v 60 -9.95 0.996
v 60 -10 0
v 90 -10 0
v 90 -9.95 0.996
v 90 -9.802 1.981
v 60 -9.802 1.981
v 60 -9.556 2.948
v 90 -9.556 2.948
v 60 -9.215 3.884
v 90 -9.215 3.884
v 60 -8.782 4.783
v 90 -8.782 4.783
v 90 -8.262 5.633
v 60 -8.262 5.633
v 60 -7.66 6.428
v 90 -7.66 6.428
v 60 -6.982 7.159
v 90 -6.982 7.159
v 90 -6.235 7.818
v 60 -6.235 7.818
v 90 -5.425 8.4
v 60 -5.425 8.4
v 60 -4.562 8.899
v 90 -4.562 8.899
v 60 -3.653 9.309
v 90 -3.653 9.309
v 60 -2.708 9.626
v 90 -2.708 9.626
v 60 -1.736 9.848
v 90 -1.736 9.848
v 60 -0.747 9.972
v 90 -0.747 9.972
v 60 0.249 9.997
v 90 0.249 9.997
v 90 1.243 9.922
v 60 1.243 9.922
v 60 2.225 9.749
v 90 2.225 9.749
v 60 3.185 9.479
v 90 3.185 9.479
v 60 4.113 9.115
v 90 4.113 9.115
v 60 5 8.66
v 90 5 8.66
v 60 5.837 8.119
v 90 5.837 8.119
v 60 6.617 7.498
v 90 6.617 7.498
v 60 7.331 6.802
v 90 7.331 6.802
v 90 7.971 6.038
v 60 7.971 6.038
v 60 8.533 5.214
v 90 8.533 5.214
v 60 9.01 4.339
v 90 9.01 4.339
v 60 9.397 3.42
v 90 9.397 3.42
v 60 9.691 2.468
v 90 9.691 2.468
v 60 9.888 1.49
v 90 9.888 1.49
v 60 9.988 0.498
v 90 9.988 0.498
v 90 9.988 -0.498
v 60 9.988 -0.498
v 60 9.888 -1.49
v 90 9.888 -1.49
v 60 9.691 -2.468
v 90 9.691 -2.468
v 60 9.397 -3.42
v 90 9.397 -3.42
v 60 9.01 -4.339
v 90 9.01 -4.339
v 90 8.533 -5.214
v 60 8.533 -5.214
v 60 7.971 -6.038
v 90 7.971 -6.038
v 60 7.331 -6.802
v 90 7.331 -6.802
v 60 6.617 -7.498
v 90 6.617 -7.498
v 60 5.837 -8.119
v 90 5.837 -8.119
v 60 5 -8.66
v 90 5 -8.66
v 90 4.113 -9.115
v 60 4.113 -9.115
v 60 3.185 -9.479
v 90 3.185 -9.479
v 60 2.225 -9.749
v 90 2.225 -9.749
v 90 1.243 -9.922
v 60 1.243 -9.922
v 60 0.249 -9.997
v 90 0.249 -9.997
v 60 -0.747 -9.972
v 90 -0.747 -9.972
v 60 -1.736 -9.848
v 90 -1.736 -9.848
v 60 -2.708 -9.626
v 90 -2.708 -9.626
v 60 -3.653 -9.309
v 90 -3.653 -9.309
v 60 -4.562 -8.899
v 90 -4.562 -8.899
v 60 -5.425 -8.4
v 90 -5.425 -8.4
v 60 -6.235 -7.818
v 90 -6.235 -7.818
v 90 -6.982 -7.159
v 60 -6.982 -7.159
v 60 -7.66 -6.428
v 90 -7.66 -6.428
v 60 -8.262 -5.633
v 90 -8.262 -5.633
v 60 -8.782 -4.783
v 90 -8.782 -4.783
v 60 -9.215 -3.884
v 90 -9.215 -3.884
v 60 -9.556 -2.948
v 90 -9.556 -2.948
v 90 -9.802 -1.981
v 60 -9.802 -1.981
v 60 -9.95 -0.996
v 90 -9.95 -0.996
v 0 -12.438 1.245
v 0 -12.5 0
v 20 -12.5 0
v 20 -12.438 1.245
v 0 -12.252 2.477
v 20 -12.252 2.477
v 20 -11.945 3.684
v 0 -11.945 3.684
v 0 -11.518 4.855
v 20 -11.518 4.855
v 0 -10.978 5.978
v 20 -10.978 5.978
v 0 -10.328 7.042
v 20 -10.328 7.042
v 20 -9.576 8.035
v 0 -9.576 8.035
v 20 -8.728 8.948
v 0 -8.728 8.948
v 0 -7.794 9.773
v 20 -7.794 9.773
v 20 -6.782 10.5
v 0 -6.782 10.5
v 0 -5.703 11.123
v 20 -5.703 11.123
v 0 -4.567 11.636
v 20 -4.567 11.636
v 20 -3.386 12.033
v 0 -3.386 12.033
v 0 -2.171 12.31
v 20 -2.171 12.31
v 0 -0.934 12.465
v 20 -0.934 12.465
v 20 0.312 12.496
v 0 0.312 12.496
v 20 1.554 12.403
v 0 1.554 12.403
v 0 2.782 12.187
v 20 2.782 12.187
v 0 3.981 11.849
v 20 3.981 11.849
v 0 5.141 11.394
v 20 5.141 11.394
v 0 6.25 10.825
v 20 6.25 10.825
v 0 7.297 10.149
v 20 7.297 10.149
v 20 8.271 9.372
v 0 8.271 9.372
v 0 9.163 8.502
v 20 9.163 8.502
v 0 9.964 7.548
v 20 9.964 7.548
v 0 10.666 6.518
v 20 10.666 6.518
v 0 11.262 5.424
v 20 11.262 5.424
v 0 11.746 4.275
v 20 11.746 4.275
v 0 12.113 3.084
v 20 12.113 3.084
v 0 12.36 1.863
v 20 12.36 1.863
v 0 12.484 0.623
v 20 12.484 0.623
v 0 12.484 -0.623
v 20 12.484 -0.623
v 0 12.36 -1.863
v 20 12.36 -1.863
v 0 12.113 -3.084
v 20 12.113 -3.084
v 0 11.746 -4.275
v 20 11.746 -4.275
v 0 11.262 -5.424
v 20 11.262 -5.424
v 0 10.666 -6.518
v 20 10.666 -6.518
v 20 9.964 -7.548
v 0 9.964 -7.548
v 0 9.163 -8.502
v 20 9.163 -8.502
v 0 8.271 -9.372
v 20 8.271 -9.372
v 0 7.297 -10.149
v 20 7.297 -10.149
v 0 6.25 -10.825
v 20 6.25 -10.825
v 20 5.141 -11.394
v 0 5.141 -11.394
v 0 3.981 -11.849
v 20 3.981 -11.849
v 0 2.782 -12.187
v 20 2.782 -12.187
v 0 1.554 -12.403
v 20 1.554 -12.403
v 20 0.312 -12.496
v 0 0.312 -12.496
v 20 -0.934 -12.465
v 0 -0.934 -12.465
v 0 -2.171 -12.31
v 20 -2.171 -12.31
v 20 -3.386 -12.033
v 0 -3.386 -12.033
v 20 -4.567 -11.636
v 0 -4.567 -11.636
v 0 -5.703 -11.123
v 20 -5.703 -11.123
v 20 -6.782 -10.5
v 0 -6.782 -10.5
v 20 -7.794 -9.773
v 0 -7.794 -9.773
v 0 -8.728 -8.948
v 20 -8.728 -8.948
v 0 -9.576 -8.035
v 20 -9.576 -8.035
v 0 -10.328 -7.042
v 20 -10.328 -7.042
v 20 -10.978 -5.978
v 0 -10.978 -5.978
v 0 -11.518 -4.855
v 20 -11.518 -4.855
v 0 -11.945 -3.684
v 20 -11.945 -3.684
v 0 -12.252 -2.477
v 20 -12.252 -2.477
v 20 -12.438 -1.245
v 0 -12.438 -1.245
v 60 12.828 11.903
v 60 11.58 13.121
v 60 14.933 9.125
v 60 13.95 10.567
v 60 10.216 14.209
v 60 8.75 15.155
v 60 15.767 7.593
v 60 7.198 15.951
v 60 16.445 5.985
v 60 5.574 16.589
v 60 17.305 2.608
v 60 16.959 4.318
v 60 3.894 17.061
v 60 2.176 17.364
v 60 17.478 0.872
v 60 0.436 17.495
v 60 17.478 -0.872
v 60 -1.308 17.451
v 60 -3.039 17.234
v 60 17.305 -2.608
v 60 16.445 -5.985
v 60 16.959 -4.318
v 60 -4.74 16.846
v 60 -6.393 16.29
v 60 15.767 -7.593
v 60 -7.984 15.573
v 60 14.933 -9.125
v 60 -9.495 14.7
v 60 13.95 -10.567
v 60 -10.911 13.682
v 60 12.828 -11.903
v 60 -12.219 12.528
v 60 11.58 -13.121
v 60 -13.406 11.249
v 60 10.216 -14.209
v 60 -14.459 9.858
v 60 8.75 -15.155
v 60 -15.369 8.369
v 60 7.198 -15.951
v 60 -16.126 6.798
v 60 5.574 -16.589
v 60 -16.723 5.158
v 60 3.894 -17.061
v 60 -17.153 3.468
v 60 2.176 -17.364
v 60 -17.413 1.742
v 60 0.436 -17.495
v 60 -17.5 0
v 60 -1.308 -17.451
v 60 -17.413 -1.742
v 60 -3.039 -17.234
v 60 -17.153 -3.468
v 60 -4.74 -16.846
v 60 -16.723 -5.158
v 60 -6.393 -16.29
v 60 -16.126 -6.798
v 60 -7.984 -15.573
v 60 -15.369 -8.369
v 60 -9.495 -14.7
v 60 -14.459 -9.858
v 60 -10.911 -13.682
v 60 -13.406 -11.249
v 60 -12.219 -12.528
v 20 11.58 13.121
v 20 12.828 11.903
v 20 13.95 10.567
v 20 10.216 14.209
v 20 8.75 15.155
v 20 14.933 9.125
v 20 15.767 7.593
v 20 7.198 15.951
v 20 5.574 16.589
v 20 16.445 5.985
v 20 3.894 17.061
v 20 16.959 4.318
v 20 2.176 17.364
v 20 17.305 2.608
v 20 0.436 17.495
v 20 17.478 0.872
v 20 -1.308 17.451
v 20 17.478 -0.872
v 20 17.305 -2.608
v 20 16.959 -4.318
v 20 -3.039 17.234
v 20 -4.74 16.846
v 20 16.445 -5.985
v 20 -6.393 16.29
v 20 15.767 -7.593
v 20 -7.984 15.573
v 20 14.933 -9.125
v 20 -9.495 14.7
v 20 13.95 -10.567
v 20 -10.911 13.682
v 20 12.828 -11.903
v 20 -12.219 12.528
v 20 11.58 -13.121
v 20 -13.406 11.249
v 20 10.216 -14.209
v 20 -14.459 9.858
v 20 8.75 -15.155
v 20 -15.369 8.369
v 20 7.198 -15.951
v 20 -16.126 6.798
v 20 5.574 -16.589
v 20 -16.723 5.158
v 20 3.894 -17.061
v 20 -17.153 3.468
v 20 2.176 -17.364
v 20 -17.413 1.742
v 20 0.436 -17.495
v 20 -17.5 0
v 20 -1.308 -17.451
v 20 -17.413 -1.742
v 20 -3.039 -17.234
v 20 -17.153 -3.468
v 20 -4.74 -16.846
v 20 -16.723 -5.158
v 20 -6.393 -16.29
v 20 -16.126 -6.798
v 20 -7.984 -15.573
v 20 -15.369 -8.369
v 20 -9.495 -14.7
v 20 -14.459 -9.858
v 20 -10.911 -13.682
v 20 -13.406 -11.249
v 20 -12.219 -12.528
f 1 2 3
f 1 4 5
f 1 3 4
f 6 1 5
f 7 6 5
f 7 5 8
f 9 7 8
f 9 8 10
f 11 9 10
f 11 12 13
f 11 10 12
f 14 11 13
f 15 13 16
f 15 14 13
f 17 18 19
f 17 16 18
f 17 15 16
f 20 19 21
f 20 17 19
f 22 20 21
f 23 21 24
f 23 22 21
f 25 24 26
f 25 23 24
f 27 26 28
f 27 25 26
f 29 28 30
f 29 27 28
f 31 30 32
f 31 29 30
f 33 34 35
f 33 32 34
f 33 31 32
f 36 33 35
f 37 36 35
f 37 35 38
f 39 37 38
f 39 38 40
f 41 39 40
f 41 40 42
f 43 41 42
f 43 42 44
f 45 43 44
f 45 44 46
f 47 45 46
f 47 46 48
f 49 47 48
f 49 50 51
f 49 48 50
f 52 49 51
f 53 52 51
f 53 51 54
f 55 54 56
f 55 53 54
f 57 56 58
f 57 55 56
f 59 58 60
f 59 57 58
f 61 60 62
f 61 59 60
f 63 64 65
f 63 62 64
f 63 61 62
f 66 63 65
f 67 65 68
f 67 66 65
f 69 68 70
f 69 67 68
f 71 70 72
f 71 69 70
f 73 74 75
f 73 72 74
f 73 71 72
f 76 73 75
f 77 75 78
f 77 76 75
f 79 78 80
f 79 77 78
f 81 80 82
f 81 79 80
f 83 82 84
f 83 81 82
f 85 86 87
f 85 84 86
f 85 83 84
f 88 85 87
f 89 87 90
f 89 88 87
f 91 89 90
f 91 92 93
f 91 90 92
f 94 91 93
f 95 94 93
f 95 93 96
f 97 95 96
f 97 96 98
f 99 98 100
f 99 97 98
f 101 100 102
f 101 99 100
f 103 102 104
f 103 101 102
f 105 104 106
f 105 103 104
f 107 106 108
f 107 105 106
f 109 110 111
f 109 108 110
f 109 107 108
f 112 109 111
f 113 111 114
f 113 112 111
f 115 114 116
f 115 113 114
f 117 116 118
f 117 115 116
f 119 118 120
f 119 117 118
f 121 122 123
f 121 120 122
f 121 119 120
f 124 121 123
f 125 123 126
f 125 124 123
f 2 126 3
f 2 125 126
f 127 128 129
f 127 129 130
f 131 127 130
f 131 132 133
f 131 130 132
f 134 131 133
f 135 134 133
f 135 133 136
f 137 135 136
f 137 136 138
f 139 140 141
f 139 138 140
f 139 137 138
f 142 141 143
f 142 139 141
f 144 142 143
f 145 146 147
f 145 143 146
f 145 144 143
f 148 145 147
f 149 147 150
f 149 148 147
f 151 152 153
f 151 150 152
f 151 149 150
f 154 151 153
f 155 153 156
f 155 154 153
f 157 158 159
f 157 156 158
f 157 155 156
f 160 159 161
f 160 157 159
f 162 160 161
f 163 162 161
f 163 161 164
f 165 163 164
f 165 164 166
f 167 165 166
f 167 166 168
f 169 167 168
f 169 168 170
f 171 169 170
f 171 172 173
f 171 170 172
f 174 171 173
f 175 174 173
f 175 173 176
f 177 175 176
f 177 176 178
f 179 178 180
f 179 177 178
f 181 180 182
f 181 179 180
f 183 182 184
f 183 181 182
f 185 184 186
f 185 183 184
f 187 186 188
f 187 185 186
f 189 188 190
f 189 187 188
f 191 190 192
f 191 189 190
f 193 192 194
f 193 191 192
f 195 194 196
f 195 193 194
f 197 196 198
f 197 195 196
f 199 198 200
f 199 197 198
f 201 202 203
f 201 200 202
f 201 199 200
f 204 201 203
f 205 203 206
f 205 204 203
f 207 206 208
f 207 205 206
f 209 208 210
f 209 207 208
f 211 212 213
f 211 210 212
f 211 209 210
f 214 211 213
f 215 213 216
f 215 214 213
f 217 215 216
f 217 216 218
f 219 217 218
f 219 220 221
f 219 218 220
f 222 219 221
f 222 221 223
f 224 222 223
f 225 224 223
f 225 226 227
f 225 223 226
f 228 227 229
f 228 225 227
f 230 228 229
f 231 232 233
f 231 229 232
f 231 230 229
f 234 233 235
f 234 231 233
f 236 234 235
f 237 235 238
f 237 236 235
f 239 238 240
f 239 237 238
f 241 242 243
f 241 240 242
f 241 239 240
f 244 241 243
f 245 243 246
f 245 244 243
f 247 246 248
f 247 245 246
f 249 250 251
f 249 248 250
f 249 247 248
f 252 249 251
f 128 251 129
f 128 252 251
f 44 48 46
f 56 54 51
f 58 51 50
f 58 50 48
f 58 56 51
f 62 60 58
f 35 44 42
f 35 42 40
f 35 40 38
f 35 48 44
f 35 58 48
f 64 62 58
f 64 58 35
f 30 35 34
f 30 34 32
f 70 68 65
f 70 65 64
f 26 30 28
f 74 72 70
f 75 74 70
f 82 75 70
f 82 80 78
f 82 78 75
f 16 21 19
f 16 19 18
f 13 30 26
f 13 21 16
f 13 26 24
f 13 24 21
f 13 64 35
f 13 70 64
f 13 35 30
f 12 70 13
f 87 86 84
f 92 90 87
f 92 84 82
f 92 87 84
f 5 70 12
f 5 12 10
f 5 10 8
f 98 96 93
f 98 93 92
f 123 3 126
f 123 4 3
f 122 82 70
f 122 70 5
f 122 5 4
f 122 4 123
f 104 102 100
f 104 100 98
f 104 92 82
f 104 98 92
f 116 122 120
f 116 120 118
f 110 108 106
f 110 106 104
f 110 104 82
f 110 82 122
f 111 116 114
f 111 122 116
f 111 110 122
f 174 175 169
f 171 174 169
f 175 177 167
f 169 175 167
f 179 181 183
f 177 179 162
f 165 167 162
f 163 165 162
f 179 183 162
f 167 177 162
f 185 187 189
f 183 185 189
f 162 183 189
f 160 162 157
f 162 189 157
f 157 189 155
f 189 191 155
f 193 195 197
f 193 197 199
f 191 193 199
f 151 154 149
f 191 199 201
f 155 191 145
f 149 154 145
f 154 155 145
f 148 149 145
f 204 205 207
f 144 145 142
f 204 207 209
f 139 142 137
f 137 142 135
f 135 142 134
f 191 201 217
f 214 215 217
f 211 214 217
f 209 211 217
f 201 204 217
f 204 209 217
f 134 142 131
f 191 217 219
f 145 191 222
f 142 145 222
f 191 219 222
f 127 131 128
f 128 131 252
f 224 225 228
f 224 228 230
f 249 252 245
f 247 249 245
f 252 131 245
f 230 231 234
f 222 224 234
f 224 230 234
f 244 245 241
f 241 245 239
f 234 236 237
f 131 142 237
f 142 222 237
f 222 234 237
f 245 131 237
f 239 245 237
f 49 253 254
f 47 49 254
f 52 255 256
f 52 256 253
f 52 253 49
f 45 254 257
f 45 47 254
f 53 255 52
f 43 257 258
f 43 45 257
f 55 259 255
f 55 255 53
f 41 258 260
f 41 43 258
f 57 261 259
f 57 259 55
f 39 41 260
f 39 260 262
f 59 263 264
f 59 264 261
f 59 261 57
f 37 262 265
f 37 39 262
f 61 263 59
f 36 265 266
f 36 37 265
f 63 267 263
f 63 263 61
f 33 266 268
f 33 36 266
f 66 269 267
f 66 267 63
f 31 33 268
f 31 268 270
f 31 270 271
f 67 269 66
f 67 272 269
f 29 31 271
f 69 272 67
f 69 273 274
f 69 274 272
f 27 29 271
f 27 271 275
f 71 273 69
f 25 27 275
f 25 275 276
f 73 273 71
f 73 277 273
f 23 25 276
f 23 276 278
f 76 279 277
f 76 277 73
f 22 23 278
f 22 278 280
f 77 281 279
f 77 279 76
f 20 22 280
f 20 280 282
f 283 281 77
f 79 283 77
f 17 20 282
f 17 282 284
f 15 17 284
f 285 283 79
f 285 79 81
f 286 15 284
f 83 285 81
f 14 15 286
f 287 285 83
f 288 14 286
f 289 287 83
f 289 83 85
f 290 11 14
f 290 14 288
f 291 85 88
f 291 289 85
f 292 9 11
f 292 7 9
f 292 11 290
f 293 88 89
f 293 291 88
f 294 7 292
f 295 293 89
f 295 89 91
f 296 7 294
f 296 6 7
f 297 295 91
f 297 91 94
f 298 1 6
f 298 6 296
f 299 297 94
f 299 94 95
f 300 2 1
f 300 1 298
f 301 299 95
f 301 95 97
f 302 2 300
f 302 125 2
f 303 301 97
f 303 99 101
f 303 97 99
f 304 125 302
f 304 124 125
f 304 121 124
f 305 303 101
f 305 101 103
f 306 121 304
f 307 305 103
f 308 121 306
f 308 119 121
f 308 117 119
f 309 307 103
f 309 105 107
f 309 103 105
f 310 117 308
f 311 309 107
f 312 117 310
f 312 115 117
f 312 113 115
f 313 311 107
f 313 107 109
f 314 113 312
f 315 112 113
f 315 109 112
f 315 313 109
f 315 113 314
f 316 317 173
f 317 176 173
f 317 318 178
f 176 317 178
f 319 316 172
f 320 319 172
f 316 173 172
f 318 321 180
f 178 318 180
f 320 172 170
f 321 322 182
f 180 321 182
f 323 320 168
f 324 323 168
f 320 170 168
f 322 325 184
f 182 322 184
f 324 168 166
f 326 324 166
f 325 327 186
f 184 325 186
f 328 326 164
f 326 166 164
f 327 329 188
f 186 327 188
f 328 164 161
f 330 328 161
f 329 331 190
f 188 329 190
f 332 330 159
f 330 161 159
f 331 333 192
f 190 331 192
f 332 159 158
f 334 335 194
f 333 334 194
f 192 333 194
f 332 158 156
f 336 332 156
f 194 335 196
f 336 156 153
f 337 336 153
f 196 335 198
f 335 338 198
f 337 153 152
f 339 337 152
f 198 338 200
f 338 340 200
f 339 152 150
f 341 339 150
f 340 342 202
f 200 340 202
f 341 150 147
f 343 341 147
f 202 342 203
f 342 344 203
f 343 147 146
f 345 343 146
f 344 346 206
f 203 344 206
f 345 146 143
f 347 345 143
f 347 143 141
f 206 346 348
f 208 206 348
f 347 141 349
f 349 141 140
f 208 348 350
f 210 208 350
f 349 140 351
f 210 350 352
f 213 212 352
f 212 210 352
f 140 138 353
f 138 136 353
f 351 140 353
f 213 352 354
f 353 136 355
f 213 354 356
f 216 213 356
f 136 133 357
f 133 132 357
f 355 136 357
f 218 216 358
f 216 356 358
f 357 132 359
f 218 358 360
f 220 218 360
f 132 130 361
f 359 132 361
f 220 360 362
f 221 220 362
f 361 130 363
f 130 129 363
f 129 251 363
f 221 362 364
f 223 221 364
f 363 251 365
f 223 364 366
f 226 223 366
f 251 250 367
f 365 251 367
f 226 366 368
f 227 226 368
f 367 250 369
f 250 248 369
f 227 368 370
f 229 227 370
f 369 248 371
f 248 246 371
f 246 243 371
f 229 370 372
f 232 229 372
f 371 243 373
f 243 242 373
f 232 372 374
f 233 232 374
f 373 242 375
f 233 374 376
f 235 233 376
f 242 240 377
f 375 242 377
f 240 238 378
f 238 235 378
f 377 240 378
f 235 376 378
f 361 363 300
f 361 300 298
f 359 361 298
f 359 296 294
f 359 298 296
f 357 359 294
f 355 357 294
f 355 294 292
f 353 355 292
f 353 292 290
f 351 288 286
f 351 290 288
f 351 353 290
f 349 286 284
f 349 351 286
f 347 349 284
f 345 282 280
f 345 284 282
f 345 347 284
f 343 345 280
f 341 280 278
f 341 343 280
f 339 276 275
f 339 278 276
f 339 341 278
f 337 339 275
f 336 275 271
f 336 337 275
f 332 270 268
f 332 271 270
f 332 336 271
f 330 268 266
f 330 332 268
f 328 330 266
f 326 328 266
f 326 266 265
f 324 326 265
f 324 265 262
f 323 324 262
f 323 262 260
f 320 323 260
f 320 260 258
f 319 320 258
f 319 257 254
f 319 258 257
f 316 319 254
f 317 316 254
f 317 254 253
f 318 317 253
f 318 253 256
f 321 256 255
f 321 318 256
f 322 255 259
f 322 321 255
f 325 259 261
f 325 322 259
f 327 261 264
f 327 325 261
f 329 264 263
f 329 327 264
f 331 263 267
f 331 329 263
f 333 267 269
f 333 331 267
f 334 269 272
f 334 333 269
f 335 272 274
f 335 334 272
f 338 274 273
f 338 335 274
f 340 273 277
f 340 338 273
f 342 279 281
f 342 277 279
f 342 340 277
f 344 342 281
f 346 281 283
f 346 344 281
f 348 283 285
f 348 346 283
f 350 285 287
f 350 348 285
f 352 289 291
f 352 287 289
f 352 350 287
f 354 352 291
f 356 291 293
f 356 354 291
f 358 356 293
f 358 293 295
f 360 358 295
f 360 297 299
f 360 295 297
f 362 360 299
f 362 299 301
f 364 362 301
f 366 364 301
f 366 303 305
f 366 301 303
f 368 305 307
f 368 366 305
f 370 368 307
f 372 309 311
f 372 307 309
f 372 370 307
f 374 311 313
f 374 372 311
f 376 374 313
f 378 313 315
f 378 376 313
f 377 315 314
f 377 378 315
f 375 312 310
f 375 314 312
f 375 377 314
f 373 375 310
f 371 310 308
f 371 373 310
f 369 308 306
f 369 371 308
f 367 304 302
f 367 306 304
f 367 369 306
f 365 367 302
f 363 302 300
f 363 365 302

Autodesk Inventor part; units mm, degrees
ref_plane "YZ Plane" through (0, 0, 0) normal (1, 0, 0) x (0, 1, 0)
ref_plane "XZ Plane" through (0, 0, 0) normal (0, 1, 0) x (-1, 0, 0)
ref_plane "XY Plane" through (0, 0, 0) normal (0, 0, 1) x (1, 0, 0)
sketch "Sketch1" plane through (0, 0, 0) normal (0, 0, 1) x (1, 0, 0)
  line L0 (0, 0) -> (90, 0)
  line L1 (90, 0) -> (90, 10)
  line L2 (90, 10) -> (60, 10)
  line L3 (60, 10) -> (60, 17.5)
  line L4 (60, 17.5) -> (20, 17.5)
  line L5 (20, 17.5) -> (20, 12.5)
  line L6 (20, 12.5) -> (0, 12.5)
  line L7 (0, 12.5) -> (0, 0)
  dimension "d0" = 90
  dimension "d1" = 40
  dimension "d2" = 20
  dimension "d3" = 20
  dimension "d4" = 35
  dimension "d5" = 25
revolve "Revolution1" add sketch "Sketch1" angle 360 mid plane about axis through (0, 0, 0) along (1, 0, 0)
